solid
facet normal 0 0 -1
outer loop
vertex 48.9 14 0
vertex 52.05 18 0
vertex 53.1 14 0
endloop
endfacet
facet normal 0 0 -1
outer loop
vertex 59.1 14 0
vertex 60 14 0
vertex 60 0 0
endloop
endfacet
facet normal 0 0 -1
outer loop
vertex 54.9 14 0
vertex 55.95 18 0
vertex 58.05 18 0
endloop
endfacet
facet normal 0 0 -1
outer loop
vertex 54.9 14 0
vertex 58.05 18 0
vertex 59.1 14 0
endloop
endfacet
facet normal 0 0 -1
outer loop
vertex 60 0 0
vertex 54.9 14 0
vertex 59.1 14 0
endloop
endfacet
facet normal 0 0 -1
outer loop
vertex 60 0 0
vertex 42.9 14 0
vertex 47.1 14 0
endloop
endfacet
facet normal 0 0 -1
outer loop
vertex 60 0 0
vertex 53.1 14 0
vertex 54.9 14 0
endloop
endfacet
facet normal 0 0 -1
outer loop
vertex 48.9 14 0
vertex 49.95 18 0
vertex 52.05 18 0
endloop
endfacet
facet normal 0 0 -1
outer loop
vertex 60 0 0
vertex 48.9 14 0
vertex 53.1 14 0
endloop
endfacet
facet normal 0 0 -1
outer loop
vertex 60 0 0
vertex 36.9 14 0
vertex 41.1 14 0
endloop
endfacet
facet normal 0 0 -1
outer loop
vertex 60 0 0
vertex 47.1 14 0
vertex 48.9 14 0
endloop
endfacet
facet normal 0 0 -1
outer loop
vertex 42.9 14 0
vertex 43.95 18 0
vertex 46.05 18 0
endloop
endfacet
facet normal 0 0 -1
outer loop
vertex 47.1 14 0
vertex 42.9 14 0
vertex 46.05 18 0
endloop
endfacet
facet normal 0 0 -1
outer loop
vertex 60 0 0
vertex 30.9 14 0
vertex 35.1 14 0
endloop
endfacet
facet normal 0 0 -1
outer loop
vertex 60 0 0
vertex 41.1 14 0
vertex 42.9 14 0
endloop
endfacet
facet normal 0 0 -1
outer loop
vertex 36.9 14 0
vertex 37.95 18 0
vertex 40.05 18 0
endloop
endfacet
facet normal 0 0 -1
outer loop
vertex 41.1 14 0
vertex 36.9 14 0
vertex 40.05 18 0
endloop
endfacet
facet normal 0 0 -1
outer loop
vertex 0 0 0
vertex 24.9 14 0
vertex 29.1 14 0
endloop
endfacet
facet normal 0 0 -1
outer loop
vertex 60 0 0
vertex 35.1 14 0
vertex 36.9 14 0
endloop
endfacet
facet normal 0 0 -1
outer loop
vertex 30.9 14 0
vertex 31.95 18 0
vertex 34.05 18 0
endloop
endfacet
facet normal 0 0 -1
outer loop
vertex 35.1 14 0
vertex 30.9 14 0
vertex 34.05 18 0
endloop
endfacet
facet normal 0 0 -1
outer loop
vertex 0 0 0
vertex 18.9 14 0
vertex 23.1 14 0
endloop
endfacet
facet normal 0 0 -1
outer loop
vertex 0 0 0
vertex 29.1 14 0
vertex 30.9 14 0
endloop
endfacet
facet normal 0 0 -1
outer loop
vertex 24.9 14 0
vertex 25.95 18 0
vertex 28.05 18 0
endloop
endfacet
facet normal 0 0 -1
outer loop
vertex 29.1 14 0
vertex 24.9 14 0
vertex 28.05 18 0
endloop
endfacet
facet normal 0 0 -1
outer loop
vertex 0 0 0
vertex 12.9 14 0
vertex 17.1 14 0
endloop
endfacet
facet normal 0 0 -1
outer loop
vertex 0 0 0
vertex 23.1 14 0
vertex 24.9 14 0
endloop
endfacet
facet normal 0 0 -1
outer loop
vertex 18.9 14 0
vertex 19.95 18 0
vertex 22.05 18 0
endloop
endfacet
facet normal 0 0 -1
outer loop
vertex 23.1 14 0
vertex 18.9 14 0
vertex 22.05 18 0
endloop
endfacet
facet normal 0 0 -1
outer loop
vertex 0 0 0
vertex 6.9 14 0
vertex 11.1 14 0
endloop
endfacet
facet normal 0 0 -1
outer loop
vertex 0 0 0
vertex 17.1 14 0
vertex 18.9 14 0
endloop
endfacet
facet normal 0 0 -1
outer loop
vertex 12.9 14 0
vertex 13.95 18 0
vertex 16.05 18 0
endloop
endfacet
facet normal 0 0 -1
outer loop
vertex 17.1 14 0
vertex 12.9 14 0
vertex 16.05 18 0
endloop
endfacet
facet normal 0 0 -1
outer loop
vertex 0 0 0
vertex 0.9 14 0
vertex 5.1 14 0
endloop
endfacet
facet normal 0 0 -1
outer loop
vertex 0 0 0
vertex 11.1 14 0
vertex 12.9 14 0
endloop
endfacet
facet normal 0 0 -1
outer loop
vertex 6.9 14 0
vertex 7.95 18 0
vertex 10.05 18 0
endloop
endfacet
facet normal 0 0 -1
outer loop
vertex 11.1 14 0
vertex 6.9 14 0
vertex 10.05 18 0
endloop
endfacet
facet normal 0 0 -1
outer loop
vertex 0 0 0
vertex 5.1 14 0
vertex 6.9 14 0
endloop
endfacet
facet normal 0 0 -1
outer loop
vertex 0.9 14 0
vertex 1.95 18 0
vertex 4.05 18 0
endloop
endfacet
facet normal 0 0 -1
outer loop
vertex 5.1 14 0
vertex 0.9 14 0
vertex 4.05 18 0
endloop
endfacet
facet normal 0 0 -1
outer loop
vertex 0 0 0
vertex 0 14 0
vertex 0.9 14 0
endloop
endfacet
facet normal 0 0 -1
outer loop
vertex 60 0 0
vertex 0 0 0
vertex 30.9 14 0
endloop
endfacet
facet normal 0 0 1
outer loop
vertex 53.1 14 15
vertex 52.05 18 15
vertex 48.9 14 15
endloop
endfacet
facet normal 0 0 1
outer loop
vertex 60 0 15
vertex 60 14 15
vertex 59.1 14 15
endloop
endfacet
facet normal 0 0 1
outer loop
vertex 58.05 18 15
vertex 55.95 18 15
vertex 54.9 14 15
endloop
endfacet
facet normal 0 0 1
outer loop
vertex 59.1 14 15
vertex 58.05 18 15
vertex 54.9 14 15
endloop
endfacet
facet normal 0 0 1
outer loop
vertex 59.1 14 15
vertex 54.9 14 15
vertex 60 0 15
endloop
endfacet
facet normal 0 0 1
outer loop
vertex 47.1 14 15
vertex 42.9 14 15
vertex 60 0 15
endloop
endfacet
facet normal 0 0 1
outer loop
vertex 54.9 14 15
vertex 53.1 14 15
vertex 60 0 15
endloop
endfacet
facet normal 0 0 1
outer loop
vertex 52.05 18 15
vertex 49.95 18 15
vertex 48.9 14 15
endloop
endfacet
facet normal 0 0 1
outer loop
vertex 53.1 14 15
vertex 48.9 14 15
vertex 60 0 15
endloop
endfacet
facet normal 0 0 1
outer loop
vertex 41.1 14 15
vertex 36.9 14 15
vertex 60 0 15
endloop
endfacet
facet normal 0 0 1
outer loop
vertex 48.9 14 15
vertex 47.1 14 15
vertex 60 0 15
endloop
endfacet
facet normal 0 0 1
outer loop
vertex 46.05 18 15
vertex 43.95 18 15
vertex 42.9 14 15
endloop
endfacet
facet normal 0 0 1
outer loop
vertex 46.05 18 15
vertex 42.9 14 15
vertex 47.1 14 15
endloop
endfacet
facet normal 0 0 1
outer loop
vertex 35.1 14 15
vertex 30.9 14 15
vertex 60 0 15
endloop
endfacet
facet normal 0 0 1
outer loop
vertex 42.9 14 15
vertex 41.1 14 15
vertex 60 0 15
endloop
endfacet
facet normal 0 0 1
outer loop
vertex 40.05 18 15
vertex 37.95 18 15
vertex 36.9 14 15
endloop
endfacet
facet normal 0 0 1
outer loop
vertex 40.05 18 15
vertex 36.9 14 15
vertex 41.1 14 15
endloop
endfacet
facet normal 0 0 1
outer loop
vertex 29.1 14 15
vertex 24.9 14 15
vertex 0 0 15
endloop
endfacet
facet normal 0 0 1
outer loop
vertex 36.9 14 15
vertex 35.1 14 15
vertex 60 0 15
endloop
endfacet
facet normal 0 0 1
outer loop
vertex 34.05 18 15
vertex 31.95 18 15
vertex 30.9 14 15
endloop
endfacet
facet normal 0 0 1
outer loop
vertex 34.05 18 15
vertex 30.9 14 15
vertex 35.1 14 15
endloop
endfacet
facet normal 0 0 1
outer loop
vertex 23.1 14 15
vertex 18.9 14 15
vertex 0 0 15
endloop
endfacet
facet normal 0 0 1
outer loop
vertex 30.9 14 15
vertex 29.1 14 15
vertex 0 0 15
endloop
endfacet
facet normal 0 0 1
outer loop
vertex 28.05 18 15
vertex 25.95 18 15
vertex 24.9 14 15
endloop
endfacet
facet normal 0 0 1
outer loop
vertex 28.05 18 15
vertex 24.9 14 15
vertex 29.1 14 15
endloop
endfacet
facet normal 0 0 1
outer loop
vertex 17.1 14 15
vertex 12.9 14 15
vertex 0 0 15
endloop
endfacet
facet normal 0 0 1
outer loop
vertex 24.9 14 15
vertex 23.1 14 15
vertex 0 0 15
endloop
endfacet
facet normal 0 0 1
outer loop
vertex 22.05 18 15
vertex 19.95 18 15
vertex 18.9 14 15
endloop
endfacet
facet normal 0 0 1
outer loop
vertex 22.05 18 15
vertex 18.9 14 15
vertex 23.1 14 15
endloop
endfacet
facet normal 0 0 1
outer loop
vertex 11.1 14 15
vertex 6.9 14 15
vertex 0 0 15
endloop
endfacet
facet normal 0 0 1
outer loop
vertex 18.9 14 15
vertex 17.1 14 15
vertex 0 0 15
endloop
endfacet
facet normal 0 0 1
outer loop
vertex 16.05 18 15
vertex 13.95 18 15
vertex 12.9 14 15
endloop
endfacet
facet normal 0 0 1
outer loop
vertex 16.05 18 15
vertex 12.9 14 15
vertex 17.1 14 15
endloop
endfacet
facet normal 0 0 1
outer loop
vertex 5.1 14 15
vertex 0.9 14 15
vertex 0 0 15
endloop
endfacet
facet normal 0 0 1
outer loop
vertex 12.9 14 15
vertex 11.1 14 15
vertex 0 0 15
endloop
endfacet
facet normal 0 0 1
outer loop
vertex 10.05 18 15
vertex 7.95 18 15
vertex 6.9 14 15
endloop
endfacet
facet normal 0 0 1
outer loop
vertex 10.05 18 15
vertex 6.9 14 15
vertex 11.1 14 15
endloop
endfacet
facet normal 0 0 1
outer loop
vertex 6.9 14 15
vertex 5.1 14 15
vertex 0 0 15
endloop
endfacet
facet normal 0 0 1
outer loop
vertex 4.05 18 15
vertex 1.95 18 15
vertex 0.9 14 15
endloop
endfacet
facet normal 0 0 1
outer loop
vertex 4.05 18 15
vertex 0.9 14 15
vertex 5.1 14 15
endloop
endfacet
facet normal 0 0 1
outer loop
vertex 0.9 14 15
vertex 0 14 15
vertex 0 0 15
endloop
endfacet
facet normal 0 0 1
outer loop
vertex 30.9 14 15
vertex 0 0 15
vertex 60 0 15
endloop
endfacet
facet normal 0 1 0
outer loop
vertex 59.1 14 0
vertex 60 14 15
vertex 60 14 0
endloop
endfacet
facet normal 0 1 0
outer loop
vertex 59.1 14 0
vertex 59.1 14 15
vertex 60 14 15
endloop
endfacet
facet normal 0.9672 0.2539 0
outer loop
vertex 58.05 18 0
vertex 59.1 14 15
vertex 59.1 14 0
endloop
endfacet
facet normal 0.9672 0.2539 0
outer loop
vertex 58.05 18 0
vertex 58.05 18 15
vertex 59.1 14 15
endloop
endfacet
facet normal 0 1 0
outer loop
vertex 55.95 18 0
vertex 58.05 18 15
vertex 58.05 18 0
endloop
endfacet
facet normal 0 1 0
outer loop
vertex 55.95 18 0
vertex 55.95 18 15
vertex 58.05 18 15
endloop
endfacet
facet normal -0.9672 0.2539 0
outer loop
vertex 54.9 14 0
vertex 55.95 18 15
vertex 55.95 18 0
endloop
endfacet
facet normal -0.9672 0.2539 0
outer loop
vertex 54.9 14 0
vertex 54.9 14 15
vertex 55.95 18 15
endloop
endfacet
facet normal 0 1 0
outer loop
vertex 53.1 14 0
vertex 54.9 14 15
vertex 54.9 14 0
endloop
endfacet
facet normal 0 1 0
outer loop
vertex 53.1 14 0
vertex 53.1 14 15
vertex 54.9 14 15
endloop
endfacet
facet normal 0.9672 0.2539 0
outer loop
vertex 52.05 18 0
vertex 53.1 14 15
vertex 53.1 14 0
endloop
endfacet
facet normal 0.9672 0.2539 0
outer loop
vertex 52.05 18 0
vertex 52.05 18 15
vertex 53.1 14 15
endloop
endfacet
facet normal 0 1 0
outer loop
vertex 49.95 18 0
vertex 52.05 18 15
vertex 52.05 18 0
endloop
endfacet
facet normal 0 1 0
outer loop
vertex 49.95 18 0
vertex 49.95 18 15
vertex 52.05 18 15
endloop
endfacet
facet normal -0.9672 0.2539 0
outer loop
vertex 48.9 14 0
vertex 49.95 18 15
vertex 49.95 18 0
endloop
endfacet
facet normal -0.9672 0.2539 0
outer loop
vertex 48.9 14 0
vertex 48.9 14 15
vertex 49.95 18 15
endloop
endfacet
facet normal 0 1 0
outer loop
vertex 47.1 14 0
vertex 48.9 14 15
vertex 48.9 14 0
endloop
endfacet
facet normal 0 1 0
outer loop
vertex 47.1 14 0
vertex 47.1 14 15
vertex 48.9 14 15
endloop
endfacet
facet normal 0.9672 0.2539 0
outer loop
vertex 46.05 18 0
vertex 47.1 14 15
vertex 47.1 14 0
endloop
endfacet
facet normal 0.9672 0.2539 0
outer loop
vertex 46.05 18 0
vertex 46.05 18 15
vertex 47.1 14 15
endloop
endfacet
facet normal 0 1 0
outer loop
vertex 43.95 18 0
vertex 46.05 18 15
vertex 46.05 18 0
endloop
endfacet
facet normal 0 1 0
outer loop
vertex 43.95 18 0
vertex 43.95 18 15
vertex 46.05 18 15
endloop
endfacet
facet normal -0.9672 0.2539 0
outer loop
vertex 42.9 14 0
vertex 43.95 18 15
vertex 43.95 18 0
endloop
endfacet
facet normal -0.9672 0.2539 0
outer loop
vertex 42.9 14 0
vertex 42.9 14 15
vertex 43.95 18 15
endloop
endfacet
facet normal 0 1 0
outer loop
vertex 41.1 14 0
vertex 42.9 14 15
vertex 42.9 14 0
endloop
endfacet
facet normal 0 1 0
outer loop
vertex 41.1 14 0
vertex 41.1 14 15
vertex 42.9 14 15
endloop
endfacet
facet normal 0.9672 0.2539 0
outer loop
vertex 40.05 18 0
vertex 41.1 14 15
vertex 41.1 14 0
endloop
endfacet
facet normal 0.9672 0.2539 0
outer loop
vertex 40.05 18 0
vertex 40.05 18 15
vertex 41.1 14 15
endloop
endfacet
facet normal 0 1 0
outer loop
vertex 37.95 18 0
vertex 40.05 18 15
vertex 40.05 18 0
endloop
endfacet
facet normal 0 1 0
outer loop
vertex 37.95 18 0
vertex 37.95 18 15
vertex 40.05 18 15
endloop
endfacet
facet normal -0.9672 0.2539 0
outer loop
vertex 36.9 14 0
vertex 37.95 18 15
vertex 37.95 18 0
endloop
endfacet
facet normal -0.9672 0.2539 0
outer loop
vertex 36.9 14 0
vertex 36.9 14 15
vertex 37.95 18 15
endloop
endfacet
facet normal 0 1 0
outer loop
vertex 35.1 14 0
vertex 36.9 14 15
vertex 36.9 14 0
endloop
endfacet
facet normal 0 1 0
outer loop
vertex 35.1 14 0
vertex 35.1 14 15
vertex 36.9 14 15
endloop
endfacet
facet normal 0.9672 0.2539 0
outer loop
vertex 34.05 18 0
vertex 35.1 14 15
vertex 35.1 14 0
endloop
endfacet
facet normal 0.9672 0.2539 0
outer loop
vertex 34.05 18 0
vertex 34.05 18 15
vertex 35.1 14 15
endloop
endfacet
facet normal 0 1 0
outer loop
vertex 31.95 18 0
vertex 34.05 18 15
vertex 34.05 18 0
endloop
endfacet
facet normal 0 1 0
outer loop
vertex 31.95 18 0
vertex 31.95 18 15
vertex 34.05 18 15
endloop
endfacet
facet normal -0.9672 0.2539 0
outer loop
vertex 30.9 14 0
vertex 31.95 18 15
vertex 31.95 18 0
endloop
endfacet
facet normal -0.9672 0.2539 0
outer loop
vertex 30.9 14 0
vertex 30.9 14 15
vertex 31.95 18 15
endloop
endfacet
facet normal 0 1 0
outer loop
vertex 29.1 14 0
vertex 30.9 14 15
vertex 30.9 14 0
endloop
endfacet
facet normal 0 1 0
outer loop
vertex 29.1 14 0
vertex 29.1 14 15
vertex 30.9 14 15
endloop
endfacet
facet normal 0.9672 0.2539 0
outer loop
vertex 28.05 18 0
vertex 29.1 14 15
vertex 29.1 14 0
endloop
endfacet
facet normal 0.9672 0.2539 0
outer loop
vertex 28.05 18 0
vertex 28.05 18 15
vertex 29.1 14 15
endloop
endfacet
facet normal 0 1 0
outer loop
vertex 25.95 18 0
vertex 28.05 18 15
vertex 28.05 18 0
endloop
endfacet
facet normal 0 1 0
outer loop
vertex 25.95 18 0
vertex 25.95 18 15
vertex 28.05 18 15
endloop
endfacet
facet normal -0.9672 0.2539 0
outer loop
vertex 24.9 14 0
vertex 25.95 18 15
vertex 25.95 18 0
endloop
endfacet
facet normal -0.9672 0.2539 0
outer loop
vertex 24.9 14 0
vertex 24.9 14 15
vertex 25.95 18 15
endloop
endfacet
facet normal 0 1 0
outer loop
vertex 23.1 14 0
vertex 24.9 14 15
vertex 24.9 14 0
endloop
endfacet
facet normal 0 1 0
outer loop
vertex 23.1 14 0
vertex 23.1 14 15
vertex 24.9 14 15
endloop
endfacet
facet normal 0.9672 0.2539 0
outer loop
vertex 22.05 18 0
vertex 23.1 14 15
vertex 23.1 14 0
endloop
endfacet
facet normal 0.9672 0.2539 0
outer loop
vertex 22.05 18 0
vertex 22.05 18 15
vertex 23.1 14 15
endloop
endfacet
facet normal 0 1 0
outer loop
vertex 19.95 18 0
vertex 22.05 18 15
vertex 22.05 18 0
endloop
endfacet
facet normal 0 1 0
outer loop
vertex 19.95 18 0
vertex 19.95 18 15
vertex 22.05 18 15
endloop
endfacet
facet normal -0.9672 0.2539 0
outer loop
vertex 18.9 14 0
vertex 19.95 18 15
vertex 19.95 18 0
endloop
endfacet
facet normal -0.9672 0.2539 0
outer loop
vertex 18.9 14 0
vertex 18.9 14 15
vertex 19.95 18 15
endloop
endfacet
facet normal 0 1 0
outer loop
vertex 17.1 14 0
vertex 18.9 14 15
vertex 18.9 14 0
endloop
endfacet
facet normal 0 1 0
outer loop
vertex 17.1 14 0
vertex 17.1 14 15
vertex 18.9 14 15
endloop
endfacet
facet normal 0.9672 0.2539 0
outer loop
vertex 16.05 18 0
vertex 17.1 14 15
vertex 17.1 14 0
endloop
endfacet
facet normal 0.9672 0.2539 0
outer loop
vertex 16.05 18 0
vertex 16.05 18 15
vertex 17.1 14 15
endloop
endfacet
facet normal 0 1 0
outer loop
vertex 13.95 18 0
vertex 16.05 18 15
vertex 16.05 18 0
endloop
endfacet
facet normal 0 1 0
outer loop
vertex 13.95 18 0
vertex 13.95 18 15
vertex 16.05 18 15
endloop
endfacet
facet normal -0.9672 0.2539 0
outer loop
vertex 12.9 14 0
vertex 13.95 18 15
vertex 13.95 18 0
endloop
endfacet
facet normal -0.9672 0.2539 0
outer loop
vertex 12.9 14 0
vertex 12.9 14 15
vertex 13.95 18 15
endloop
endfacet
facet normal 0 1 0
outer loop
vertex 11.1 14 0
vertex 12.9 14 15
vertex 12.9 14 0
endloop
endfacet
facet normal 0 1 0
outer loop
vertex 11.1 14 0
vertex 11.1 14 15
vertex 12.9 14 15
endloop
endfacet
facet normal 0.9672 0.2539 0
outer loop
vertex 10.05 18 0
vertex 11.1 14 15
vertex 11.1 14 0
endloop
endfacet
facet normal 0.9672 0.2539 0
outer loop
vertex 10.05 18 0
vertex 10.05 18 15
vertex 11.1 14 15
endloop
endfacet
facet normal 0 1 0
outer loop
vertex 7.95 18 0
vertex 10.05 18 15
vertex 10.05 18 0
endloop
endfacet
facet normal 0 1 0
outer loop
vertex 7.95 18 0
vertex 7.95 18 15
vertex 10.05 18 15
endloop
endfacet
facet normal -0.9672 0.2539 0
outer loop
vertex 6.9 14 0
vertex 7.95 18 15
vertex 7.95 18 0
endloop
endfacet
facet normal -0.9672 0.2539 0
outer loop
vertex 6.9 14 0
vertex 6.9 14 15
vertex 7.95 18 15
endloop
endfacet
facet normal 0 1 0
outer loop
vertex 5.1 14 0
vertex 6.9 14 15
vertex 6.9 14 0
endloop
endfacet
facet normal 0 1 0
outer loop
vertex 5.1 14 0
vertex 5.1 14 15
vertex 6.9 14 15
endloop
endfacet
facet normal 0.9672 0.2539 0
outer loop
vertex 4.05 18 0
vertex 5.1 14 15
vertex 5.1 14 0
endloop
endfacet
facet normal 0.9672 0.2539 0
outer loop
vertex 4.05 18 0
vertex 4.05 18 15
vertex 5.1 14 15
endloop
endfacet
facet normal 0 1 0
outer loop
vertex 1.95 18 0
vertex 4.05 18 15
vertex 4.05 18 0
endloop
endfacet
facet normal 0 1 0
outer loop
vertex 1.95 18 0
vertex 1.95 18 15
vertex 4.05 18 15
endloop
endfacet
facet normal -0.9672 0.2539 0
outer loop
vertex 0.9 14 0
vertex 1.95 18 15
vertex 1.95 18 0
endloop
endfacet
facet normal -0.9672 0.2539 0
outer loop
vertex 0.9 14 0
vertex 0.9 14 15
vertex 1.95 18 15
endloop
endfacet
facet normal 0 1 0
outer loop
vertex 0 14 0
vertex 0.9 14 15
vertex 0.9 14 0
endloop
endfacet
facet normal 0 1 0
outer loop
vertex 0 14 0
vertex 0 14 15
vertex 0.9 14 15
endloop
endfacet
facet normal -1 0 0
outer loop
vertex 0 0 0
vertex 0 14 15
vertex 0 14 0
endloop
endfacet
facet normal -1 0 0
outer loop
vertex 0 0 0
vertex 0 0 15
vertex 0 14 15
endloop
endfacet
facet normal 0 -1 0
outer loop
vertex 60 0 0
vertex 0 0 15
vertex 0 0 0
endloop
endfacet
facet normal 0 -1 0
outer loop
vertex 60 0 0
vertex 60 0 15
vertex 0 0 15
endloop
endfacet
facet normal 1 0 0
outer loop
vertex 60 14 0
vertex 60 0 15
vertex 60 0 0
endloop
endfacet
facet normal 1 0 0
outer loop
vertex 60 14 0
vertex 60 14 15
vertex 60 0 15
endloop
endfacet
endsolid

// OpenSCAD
$fn = 32;

// ----------------------------------------------------------------------
// Gear rack: 10 teeth, pitch 6 mm
// ----------------------------------------------------------------------

// --- parameters (mm) ---
teeth = 10;               // number of teeth
pitch = 6;                // tooth pitch, X
root_w = 4.2;             // tooth width at the root
tip_w = 2.1;              // tooth width at the tip
base_h = 14;              // rack body height, Y
tooth_h = 4;              // tooth height above the body
plate_t = 15;             // rack width, Z (extrusion height)

rack_l = teeth * pitch;  // overall length
total_h = base_h + tooth_h;  // overall height

profile = [[0, 0], [60, 0], [60, 14], [59.1, 14], [58.05, 18], [55.95, 18], [54.9, 14], [53.1, 14], [52.05, 18], [49.95, 18], [48.9, 14], [47.1, 14], [46.05, 18], [43.95, 18], [42.9, 14], [41.1, 14], [40.05, 18], [37.95, 18], [36.9, 14], [35.1, 14], [34.05, 18], [31.95, 18], [30.9, 14], [29.1, 14], [28.05, 18], [25.95, 18], [24.9, 14], [23.1, 14], [22.05, 18], [19.95, 18], [18.9, 14], [17.1, 14], [16.05, 18], [13.95, 18], [12.9, 14], [11.1, 14], [10.05, 18], [7.95, 18], [6.9, 14], [5.1, 14], [4.05, 18], [1.95, 18], [0.9, 14], [0, 14]];  // primary outline, 44 points, counter clockwise

// --- the one profile operation ---
linear_extrude(height = plate_t) polygon(points = profile);
